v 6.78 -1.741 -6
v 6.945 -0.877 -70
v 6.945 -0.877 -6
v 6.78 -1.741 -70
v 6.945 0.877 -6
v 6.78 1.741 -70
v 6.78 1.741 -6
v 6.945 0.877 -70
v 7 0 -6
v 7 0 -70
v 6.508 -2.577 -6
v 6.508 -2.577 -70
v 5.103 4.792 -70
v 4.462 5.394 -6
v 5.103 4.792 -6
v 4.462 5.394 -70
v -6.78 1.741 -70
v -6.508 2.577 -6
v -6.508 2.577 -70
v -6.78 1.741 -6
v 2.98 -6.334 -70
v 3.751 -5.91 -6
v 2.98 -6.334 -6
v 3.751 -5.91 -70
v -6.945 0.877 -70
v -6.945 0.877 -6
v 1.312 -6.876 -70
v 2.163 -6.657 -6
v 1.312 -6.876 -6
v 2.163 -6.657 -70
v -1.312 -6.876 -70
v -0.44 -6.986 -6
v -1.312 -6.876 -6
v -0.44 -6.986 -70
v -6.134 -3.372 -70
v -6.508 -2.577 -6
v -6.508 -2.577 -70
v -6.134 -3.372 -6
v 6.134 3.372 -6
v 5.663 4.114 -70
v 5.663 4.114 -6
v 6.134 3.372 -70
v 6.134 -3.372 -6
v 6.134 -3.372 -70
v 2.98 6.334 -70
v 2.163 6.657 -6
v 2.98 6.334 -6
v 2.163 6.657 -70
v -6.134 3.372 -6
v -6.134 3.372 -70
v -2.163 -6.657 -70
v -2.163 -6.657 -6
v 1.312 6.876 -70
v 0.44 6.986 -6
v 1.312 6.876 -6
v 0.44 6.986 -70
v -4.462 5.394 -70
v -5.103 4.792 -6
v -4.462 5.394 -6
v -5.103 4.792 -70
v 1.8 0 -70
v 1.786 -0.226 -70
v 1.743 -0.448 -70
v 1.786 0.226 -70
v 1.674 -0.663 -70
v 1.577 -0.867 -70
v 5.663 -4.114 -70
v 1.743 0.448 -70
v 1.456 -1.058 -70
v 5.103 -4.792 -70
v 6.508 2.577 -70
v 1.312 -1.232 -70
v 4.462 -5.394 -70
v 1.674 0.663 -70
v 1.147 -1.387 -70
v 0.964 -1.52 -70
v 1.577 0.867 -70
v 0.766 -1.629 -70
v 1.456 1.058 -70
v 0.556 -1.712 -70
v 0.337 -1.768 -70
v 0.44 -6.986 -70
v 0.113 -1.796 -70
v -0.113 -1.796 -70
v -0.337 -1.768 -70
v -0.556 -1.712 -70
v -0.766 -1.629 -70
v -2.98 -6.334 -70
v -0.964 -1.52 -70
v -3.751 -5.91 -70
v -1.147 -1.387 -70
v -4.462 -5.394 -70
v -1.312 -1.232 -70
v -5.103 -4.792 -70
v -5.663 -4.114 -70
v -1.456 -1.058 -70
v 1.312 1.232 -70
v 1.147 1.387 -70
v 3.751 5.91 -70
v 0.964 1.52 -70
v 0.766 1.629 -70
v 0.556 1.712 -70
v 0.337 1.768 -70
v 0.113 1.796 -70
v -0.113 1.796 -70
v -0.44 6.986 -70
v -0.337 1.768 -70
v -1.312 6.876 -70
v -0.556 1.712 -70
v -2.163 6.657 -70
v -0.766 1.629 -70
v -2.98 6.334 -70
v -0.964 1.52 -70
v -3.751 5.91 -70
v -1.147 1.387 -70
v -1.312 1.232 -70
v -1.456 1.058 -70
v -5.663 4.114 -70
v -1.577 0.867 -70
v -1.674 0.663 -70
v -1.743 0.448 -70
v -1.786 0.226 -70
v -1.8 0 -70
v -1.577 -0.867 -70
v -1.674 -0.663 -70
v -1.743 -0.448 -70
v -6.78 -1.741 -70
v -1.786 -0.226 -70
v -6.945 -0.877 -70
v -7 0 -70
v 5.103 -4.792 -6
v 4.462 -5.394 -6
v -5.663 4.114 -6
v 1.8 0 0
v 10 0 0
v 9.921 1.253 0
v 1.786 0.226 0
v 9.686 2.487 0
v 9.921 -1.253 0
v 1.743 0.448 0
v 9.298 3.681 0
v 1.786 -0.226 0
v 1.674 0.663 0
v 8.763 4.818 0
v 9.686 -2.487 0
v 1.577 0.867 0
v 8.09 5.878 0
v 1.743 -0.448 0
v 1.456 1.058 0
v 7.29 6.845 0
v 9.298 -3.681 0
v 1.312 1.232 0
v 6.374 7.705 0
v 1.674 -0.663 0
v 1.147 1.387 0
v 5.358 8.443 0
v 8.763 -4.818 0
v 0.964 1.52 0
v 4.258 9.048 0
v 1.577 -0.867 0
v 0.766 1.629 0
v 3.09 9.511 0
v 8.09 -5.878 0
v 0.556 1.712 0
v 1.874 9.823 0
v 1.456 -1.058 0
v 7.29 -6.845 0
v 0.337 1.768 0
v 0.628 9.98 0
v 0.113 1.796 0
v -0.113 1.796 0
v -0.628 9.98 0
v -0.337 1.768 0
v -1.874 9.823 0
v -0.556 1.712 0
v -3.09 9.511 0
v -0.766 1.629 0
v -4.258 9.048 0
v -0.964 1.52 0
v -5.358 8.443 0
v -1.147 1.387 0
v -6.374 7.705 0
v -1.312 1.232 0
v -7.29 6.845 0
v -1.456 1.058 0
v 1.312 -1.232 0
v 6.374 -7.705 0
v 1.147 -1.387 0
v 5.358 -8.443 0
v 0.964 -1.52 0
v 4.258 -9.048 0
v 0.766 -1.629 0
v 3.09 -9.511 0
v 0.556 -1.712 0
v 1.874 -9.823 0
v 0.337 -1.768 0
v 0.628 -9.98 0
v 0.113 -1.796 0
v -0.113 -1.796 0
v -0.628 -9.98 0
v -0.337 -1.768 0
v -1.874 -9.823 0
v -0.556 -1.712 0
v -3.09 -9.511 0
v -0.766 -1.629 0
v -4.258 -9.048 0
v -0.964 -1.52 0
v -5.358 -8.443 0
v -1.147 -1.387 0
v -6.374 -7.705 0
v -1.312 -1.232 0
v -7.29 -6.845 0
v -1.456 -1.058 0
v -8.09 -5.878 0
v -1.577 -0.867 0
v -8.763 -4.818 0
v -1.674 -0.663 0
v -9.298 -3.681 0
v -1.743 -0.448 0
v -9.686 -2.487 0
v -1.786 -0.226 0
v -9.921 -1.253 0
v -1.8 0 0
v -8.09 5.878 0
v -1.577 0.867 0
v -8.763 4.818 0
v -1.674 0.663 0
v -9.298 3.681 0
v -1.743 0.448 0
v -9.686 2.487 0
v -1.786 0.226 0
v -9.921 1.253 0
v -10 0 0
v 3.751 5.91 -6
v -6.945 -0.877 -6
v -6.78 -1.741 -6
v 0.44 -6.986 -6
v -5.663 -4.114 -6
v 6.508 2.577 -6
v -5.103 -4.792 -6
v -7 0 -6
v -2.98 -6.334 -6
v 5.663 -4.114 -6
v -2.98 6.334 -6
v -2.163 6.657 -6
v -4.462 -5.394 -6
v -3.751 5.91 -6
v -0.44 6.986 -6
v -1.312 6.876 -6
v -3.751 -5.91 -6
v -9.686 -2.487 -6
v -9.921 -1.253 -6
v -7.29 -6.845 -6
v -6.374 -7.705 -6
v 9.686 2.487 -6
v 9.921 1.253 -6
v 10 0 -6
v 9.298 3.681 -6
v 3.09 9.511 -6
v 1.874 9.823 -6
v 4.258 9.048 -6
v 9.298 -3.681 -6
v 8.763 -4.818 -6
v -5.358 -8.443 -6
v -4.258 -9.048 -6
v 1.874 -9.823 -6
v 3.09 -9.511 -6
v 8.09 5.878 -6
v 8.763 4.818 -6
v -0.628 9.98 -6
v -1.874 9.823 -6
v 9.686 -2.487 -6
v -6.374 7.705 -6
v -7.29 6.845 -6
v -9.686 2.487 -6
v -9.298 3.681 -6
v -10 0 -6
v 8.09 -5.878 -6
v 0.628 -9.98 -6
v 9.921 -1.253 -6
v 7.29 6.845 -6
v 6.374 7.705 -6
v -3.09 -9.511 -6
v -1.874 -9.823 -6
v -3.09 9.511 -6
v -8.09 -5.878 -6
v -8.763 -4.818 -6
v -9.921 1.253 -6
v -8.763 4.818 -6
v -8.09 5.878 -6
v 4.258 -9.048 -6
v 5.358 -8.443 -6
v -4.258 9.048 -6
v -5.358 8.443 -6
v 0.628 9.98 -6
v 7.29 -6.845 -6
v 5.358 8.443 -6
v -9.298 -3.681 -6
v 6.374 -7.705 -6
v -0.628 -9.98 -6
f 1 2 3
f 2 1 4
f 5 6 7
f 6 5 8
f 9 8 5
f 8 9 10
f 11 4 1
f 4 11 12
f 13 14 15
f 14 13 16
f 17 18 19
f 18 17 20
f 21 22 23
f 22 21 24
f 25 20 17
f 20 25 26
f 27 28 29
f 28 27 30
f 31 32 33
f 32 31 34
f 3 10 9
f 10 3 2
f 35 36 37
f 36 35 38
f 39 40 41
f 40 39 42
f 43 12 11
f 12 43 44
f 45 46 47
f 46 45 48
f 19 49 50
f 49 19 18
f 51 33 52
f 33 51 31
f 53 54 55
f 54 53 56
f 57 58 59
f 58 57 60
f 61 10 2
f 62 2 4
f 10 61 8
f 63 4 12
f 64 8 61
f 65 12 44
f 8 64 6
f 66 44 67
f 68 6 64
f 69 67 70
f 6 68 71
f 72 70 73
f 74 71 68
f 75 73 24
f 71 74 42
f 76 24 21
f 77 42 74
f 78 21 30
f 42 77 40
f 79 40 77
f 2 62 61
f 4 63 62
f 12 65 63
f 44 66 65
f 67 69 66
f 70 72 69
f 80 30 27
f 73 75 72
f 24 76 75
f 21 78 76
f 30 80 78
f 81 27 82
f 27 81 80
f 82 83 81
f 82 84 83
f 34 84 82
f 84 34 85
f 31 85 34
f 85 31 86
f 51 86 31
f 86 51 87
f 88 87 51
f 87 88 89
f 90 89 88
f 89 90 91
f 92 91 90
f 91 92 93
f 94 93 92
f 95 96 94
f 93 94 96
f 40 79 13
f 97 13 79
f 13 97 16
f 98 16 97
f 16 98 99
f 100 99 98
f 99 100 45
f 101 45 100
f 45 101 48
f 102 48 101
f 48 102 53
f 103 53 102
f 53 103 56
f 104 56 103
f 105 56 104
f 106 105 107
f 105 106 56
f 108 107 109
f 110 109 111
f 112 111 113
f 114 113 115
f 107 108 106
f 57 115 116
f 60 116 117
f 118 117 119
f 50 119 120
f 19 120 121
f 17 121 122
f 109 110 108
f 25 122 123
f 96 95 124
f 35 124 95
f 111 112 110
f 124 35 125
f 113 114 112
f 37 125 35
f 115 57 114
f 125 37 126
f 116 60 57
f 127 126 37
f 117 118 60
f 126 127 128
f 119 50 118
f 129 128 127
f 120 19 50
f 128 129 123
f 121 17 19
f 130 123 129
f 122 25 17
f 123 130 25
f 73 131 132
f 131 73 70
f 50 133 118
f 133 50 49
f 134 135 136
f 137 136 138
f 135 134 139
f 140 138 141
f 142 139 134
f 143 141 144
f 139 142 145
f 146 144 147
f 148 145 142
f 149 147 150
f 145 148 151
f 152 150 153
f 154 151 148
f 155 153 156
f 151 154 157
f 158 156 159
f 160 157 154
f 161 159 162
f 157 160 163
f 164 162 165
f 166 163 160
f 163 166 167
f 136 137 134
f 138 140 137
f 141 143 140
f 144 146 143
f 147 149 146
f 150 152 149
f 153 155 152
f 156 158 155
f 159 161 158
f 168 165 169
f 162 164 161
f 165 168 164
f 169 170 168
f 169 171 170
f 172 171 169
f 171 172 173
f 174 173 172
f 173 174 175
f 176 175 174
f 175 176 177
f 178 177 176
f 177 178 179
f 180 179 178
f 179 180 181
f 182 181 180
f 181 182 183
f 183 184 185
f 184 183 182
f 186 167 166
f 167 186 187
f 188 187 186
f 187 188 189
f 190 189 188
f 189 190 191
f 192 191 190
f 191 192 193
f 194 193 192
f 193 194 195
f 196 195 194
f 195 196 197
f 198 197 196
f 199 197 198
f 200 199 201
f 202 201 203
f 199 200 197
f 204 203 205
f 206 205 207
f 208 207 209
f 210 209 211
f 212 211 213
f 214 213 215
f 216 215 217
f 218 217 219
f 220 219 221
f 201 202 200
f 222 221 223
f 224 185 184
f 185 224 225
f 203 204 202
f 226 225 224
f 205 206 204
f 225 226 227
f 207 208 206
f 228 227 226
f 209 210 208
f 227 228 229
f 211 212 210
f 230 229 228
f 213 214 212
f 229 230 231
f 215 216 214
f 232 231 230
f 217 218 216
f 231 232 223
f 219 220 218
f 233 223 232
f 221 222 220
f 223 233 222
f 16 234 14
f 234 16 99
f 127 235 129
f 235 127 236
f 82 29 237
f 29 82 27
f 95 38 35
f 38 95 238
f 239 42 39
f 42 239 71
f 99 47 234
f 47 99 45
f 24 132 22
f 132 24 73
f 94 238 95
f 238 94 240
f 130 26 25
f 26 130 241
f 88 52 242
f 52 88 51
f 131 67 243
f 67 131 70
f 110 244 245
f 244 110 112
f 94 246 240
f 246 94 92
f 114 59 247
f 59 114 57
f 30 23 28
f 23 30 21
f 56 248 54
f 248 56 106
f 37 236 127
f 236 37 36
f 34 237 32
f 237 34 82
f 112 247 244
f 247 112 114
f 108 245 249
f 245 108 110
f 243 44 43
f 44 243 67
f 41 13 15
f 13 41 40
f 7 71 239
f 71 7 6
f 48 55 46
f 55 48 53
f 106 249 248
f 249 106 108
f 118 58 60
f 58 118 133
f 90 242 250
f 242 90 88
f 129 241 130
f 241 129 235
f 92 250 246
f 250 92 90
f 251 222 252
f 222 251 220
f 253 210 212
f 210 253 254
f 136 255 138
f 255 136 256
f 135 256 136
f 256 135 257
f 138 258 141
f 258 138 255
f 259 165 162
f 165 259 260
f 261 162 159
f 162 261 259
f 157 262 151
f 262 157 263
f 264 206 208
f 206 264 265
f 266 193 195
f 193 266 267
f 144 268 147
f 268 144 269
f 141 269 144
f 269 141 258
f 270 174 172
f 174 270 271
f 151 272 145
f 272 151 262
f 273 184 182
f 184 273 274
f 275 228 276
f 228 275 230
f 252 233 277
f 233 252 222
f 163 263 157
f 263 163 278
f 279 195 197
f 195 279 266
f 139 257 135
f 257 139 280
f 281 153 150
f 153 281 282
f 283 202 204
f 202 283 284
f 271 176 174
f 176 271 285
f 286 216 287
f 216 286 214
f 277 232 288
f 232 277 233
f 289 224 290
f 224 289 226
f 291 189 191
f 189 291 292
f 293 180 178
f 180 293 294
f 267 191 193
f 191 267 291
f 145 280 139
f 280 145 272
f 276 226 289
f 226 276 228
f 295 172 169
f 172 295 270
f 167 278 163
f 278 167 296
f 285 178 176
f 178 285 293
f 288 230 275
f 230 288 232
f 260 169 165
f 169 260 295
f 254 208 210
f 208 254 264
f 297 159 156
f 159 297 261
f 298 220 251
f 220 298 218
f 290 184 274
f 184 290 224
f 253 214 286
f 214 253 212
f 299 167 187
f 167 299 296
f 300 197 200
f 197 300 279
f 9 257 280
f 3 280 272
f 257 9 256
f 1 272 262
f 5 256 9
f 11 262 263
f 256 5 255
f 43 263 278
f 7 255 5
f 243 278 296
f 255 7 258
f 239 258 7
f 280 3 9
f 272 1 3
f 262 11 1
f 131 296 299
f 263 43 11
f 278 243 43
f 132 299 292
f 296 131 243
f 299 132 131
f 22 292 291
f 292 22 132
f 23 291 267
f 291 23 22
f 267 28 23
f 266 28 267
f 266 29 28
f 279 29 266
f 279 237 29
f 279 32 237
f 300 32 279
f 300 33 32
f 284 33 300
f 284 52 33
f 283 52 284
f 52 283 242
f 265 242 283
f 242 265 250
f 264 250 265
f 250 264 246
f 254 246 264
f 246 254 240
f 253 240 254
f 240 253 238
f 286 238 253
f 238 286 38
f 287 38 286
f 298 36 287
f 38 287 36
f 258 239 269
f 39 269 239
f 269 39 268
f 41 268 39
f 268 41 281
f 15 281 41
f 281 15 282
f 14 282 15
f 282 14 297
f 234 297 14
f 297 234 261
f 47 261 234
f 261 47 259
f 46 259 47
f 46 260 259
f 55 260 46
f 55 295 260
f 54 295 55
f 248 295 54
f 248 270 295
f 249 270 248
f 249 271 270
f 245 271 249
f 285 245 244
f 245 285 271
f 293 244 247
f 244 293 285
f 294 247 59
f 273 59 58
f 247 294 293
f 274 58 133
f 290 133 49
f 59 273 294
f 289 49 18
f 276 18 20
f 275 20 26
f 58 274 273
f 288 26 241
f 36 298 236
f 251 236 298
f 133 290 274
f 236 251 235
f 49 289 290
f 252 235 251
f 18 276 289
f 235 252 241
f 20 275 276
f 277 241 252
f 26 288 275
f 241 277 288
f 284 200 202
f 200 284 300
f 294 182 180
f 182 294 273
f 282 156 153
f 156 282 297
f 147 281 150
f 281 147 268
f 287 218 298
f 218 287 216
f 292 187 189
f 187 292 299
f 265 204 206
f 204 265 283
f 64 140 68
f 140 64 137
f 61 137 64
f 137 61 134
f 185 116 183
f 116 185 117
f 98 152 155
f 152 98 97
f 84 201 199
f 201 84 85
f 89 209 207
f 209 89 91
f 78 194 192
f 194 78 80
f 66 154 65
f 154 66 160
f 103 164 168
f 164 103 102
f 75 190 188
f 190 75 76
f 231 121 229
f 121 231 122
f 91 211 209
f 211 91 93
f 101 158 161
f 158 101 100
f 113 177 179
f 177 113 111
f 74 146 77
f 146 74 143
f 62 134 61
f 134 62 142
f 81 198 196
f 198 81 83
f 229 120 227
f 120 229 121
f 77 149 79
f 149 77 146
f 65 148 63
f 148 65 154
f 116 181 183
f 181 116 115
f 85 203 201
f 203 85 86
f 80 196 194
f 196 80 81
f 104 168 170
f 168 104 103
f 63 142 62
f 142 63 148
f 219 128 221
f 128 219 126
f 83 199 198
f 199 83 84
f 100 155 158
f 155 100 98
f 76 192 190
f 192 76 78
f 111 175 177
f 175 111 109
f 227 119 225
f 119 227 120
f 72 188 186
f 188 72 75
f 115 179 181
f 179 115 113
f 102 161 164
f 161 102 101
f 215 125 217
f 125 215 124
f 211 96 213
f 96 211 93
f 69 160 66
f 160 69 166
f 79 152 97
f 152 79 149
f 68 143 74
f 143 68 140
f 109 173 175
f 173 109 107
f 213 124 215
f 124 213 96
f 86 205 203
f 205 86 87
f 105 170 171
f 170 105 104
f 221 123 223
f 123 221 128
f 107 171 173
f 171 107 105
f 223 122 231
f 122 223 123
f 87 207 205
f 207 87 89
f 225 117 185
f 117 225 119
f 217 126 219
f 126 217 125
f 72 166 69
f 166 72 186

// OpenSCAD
$fn = 50;


difference() {
	union() {
		translate(v = [0, 0, -70.0000000000]) {
			cylinder(h = 70, r = 7.0000000000);
		}
		translate(v = [0, 0, -6.0000000000]) {
			cylinder(h = 6, r = 10.0000000000);
		}
	}
	union() {
		#translate(v = [0, 0, -70]) {
			cylinder(h = 70, r = 1.8000000000);
		}
	}
}
